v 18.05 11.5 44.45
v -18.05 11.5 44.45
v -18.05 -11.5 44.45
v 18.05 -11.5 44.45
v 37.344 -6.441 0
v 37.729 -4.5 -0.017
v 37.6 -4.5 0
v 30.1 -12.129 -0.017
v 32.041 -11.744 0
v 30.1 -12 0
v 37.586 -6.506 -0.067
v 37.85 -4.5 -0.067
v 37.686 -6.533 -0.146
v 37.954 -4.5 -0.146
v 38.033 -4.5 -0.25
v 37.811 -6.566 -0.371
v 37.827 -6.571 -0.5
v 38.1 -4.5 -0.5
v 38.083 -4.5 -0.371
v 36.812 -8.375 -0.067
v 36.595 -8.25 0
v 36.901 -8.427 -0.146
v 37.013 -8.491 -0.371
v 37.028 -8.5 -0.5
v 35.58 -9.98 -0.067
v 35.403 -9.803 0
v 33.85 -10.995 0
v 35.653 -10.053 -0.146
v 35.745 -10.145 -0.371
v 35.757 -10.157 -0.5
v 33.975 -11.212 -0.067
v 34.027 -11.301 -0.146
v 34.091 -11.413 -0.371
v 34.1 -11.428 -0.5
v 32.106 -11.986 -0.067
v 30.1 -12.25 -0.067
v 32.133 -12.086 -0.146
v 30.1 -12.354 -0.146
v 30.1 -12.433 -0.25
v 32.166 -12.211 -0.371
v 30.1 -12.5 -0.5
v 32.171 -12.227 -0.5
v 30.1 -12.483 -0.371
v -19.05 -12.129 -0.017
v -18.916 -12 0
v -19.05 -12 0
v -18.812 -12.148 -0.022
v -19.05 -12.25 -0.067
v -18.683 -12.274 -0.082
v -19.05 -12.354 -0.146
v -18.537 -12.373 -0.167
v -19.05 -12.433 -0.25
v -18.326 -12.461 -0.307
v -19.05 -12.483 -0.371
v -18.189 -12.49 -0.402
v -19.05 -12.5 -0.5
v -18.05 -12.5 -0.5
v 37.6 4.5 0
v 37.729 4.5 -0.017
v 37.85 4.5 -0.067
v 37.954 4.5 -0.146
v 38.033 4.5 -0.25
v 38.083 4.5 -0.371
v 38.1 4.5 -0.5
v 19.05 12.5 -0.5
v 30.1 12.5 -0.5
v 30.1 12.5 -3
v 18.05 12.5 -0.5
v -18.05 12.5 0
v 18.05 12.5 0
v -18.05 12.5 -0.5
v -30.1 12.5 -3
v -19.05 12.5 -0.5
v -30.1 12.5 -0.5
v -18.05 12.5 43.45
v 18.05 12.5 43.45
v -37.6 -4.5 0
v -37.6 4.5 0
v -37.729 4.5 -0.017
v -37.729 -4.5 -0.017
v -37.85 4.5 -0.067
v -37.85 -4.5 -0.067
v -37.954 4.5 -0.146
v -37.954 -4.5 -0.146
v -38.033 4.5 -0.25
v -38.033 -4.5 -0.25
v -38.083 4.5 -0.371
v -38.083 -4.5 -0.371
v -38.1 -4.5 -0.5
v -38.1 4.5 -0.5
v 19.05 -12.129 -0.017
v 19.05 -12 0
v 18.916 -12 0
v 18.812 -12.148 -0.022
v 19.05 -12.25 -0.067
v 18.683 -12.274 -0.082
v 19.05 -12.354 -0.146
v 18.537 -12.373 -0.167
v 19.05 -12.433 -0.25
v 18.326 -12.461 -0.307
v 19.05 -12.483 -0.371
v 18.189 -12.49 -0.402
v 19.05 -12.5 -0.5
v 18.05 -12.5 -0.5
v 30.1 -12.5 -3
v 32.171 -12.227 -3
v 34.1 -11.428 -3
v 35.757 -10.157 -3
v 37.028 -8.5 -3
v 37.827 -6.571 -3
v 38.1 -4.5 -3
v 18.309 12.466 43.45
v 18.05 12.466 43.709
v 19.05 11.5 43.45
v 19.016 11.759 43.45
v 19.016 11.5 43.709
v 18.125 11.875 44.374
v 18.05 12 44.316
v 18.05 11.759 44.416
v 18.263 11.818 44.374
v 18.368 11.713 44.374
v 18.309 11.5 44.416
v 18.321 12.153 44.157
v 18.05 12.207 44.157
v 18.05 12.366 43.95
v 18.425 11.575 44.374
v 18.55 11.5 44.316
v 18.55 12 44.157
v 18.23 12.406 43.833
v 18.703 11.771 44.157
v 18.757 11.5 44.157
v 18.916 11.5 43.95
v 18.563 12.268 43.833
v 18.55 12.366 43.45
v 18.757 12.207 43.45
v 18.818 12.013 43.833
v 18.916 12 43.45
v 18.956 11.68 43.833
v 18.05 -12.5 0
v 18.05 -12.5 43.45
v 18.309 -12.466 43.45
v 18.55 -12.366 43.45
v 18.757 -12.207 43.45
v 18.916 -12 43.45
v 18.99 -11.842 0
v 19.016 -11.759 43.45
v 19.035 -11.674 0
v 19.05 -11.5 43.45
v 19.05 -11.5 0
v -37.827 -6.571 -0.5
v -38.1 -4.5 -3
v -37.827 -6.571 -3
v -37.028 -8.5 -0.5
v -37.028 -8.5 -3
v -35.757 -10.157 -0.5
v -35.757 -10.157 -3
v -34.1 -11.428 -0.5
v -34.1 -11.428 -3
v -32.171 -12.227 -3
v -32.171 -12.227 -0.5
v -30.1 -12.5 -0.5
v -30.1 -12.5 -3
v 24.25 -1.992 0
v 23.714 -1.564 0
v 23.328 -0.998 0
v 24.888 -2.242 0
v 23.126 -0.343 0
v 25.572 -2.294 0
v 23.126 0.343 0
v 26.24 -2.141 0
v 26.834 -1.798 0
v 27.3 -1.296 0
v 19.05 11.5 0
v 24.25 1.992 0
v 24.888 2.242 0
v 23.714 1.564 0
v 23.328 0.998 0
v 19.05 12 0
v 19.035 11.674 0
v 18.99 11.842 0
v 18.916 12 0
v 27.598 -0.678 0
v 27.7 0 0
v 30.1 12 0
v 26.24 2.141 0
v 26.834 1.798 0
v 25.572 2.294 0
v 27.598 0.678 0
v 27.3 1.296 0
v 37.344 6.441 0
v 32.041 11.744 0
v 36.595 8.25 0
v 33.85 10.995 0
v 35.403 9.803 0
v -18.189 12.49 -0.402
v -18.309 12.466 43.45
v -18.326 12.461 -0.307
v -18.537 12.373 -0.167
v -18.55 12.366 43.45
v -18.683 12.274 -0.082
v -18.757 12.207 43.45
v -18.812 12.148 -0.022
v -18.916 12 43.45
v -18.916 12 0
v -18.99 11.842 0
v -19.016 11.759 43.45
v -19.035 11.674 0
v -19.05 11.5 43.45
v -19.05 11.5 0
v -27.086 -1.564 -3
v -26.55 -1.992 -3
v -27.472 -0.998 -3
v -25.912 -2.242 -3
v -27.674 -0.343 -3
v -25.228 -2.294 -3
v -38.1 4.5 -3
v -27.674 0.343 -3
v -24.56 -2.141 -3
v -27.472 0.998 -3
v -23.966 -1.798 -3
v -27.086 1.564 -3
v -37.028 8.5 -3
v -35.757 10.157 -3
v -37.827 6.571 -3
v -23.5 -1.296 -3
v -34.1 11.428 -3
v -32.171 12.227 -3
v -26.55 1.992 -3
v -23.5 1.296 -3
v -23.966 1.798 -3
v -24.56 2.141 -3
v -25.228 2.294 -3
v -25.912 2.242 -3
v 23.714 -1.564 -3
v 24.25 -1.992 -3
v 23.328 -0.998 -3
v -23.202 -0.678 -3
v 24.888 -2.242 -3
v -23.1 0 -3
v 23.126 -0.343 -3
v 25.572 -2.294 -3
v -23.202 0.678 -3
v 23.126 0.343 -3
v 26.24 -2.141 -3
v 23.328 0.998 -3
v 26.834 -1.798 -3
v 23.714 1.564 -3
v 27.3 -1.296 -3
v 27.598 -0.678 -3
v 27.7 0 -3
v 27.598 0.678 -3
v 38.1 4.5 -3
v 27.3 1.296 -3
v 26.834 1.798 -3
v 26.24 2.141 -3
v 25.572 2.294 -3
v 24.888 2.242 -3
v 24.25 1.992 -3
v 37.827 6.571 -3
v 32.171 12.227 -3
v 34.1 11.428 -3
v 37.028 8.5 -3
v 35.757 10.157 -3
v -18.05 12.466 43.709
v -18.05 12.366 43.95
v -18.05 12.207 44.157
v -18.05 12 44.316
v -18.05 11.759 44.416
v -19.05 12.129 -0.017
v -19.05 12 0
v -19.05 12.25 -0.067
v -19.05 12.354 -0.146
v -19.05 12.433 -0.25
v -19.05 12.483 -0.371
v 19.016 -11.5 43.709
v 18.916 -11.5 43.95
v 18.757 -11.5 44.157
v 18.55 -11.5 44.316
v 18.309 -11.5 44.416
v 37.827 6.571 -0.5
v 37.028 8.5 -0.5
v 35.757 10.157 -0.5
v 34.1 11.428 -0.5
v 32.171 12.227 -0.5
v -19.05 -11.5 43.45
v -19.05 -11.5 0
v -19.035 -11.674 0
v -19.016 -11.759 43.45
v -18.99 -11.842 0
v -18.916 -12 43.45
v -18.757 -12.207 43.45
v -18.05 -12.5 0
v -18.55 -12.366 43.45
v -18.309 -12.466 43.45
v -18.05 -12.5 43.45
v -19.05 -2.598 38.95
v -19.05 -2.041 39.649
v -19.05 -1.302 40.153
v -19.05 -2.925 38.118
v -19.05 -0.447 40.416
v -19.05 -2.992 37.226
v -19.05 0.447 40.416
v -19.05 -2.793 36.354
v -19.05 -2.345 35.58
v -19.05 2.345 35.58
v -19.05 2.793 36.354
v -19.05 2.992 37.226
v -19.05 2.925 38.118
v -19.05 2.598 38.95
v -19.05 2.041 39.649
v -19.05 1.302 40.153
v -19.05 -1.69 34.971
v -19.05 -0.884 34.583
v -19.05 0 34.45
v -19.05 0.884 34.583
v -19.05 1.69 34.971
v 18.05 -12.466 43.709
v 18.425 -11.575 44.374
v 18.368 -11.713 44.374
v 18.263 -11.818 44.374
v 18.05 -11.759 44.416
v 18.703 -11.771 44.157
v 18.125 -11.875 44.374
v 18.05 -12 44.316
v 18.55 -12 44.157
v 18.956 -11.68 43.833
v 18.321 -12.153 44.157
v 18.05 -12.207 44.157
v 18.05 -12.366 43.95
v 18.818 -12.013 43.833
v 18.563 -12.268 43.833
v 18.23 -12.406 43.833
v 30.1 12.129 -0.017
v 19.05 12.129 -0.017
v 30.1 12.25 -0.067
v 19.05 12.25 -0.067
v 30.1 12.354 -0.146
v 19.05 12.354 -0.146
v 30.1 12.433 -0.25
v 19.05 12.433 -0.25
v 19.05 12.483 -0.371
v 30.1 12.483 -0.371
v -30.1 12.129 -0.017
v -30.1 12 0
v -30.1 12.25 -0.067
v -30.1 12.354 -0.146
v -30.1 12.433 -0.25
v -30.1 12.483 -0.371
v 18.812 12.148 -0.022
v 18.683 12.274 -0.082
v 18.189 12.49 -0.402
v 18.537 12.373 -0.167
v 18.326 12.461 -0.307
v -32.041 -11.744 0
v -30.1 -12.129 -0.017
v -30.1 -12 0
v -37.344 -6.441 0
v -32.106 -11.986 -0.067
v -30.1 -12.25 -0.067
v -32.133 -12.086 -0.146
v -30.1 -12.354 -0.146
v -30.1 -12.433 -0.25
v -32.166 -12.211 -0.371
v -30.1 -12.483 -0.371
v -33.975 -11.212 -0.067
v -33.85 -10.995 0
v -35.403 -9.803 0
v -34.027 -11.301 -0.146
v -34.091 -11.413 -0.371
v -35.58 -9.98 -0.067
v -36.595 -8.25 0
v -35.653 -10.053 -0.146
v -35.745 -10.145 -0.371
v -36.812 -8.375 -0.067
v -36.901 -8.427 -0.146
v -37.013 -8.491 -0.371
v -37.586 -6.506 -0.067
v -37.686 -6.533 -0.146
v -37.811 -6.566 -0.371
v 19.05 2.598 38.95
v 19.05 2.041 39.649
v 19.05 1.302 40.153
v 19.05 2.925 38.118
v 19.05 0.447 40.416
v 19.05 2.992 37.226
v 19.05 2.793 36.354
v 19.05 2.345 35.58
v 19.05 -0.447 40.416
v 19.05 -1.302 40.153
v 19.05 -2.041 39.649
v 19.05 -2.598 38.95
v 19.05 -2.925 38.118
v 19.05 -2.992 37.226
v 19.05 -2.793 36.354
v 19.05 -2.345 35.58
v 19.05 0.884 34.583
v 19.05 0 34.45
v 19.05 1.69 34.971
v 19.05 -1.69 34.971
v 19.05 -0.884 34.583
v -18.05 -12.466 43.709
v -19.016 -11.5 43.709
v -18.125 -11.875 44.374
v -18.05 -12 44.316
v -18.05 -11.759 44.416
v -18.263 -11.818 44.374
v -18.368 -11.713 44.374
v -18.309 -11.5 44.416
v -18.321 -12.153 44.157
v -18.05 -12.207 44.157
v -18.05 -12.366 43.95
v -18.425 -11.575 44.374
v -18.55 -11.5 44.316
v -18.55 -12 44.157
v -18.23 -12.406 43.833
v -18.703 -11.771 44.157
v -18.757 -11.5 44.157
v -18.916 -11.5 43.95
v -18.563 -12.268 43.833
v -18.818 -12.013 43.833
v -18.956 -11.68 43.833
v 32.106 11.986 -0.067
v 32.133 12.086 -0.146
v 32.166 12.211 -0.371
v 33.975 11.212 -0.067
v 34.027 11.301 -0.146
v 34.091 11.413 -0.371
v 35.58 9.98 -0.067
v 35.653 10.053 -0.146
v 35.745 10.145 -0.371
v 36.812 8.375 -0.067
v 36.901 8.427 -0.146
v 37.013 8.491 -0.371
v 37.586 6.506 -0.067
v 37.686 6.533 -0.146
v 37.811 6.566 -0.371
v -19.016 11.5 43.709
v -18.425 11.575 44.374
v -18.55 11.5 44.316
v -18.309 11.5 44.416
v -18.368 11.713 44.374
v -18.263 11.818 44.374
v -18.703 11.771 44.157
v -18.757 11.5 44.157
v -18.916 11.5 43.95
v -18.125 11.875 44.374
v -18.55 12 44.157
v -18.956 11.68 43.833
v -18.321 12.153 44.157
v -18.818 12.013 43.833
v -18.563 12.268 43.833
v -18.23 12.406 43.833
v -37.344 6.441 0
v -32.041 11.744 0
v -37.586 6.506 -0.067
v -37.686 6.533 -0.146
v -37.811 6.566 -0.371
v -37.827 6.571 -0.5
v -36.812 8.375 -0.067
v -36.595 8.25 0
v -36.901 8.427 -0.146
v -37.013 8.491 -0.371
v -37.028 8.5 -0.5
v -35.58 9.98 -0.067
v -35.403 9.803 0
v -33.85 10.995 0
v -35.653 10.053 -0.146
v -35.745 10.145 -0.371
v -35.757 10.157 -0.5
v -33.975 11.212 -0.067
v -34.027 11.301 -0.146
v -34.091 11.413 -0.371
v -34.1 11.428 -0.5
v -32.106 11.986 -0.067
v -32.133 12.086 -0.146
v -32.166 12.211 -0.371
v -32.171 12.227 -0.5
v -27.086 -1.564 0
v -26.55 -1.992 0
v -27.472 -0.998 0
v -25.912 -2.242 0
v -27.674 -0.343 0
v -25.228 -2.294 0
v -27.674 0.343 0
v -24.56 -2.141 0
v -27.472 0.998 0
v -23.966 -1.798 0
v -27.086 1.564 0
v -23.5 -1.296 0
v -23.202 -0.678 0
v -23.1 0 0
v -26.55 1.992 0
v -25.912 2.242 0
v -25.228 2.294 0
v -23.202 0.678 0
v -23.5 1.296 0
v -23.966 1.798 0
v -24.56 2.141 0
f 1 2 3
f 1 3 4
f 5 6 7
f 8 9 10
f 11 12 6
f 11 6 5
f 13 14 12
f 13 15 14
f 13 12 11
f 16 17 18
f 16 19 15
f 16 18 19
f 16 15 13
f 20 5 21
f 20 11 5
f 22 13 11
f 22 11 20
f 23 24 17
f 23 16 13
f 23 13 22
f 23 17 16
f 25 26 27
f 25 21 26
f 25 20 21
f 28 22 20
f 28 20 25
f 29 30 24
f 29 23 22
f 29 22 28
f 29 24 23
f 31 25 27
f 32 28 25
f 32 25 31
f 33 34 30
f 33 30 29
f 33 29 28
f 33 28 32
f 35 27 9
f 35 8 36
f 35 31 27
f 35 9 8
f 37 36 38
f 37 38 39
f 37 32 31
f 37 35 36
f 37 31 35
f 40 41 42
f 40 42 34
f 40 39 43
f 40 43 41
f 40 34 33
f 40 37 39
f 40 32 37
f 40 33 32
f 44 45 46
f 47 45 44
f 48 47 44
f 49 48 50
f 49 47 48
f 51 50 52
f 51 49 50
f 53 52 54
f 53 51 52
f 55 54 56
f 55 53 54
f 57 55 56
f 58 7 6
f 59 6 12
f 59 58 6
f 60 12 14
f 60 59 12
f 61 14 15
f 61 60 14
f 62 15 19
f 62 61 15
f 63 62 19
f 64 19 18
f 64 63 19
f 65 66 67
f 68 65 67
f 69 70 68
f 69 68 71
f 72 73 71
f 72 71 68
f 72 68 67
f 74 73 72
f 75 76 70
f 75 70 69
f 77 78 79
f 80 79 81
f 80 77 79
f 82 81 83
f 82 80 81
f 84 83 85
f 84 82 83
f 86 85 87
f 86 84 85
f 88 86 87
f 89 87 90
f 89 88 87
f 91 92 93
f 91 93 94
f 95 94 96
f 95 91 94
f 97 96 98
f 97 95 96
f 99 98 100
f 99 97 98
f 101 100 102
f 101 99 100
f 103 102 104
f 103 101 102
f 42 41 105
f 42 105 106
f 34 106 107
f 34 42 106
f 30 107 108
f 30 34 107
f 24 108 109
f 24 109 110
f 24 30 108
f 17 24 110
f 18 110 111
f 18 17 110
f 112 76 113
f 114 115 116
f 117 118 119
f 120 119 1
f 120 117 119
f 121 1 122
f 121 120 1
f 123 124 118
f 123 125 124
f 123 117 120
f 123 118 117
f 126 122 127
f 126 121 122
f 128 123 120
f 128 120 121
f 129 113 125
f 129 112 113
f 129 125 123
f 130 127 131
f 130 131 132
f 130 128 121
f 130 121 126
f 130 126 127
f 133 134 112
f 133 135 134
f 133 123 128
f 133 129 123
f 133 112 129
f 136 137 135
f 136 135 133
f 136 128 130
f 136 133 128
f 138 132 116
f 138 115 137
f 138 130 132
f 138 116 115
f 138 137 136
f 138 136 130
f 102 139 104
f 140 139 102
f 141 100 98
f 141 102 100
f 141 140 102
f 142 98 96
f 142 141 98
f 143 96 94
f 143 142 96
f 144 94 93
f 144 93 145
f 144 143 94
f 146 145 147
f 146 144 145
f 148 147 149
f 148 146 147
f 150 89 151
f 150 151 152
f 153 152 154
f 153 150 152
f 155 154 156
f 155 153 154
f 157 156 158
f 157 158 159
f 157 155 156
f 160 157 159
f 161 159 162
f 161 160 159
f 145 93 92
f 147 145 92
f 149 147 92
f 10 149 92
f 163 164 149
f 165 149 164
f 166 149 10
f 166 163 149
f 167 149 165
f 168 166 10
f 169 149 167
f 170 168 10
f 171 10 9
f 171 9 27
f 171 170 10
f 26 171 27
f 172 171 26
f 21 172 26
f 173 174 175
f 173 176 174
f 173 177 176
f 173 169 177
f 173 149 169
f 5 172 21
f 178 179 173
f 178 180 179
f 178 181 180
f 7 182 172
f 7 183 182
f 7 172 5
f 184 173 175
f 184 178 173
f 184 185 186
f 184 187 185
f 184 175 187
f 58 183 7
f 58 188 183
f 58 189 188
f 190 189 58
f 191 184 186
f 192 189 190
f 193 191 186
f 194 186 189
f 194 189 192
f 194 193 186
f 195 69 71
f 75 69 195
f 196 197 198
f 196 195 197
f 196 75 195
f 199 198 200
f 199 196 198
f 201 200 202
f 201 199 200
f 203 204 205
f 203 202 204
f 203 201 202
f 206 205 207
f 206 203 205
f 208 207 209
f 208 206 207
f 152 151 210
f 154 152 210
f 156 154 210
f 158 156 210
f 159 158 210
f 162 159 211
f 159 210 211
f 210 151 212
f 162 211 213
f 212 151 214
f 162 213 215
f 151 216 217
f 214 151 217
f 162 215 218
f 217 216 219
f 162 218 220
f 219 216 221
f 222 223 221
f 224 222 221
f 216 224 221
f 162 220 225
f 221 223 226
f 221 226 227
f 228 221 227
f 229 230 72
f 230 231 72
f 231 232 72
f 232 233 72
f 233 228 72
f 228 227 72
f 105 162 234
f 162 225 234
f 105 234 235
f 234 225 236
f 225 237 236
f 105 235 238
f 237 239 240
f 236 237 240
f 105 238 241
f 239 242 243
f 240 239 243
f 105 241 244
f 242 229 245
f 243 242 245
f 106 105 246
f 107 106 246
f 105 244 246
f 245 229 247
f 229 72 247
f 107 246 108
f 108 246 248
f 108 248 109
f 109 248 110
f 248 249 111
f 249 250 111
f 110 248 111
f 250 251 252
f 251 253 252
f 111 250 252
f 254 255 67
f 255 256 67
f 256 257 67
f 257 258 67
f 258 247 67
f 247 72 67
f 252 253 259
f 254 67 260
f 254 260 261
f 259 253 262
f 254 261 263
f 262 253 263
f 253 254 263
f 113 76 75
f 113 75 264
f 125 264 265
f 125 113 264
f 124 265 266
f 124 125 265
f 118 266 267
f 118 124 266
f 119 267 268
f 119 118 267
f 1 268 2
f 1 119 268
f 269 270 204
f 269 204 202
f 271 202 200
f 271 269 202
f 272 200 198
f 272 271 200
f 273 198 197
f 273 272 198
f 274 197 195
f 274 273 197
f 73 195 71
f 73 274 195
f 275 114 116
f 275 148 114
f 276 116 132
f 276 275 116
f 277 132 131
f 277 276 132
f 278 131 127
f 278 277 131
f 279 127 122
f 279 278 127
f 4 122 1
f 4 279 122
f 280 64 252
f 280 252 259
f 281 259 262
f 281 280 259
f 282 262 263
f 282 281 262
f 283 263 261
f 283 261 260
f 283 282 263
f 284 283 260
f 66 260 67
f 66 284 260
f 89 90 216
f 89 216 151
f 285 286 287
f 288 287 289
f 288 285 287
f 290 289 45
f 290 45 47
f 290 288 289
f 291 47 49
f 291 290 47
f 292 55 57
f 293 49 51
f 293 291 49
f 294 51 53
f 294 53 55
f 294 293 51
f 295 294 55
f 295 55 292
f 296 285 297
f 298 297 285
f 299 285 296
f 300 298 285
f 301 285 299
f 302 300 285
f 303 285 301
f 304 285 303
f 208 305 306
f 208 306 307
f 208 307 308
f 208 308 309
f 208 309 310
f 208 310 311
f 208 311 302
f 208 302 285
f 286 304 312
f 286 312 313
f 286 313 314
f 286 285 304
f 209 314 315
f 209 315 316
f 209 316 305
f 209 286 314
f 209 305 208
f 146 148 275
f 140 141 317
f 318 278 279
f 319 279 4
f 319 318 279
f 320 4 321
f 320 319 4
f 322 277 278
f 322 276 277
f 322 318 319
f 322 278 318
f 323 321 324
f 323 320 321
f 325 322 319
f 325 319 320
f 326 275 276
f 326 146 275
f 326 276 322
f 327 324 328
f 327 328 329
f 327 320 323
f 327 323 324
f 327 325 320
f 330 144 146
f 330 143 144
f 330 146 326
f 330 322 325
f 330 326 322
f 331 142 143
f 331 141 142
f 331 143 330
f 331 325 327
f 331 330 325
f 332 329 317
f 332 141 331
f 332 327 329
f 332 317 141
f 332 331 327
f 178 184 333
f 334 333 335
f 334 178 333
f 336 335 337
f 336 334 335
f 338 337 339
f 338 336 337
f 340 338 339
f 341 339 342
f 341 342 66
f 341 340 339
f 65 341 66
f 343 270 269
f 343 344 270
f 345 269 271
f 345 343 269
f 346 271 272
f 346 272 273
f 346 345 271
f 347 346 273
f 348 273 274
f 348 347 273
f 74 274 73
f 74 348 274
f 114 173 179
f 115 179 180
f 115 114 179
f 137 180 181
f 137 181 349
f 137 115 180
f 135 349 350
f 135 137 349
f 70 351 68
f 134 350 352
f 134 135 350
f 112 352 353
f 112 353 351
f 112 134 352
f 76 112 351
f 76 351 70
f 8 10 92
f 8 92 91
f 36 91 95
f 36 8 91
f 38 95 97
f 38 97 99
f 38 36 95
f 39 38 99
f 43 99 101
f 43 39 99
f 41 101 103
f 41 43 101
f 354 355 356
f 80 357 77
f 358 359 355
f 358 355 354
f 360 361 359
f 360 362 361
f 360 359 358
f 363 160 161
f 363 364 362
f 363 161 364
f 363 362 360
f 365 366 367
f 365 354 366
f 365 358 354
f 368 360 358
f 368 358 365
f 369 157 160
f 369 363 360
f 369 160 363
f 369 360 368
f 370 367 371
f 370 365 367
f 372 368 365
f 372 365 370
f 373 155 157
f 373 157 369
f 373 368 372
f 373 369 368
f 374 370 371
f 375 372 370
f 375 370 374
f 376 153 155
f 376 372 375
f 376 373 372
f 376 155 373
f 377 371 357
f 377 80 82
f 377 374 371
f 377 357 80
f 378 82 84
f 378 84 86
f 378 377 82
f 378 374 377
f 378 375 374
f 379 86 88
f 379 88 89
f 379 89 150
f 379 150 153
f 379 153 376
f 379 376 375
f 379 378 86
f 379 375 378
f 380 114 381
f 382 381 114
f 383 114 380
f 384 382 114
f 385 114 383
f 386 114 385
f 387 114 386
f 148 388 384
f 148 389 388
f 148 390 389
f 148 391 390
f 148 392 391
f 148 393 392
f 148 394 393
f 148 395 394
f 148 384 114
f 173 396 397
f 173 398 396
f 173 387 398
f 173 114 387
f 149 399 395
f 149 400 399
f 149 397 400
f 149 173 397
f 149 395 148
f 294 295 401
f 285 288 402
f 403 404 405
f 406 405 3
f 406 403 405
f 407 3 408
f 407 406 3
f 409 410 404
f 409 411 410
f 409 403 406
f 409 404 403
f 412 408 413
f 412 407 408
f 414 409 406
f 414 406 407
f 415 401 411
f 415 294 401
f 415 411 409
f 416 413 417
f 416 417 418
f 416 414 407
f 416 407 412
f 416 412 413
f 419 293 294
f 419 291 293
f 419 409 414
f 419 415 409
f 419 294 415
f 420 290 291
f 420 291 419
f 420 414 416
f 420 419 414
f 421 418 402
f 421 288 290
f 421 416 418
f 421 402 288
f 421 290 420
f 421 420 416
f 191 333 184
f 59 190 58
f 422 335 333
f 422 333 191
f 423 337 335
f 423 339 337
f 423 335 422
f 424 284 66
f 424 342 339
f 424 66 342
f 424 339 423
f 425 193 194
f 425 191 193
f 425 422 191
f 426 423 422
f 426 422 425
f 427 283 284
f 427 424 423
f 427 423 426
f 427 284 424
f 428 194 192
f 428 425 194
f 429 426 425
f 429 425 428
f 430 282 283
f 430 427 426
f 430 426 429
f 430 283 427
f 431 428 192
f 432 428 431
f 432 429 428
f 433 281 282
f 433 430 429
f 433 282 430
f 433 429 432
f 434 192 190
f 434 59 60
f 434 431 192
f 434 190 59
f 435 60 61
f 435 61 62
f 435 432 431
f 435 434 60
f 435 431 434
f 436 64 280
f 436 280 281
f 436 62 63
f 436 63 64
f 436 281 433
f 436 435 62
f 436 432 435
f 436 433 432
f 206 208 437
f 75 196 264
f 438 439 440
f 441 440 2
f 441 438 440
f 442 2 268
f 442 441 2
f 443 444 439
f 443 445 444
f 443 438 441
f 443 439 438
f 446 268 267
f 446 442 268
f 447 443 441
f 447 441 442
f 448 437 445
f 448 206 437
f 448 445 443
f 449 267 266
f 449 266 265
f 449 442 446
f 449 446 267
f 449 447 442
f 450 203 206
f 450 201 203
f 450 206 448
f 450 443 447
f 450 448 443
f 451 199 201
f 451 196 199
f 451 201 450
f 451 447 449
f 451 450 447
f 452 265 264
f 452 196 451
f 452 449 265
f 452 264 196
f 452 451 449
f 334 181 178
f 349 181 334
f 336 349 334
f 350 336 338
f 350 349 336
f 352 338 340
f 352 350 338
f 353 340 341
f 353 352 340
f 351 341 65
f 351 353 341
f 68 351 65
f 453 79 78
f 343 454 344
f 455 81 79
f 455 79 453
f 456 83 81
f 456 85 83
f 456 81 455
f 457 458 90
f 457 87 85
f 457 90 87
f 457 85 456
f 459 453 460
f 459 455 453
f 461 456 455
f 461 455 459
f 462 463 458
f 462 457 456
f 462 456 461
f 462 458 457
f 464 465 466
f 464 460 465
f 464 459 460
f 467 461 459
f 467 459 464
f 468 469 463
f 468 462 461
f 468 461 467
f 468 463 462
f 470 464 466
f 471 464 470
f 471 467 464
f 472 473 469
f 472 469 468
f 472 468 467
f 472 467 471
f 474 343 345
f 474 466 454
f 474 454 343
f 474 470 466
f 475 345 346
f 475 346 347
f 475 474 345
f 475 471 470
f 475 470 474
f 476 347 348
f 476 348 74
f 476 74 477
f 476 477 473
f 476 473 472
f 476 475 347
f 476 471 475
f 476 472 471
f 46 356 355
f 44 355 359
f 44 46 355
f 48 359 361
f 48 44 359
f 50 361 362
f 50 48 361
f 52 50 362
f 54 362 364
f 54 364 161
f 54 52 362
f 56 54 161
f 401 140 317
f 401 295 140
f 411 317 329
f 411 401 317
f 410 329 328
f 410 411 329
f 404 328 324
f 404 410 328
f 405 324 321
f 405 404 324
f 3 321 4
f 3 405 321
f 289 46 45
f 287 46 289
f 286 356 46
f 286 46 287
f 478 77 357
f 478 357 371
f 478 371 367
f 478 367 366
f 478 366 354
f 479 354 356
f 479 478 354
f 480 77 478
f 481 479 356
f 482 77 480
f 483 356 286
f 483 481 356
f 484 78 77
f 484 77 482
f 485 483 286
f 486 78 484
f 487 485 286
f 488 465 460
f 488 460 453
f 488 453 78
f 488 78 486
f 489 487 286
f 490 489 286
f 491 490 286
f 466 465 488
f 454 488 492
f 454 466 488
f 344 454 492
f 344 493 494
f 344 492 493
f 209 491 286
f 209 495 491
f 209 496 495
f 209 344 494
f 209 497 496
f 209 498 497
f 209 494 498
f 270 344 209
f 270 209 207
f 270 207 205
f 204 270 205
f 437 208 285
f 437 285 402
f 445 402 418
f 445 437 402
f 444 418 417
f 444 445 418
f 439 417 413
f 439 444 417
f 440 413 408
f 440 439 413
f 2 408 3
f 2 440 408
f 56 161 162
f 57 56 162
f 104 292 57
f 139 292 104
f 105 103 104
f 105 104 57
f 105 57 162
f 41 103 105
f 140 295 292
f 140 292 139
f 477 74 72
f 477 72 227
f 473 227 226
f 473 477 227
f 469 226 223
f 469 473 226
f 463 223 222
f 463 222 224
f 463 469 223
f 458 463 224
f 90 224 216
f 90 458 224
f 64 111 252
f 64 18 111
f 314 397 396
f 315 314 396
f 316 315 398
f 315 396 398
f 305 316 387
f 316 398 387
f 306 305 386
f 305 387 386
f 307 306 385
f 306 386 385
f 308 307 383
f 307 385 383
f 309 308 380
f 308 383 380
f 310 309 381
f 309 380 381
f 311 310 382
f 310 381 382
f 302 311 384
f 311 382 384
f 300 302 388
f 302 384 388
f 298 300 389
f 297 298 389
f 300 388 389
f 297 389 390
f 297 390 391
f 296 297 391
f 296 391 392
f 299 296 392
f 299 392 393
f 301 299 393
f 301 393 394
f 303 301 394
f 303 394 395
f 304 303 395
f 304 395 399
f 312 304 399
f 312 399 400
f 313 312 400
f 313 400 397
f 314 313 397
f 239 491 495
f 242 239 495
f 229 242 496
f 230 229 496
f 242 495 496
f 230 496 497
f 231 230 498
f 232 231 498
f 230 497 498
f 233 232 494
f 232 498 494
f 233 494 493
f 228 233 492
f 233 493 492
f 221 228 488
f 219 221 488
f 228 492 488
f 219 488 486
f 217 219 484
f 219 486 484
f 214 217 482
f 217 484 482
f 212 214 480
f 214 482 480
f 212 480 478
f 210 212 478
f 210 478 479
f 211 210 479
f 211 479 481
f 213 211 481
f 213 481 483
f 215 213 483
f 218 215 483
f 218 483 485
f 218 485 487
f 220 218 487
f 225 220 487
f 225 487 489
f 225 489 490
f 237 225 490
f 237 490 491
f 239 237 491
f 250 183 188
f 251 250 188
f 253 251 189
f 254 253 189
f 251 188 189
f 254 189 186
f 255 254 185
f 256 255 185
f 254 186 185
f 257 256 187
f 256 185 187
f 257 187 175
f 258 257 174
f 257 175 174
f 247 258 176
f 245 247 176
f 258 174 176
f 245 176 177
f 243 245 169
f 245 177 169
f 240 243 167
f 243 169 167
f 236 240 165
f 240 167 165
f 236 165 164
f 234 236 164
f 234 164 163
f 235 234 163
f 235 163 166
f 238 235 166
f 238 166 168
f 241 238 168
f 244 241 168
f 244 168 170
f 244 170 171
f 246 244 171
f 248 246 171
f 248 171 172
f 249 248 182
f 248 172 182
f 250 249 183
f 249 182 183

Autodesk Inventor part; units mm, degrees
ref_plane "YZ Plane" through (0, 0, 0) normal (1, 0, 0) x (0, 1, 0)
ref_plane "XZ Plane" through (0, 0, 0) normal (0, 1, 0) x (-1, 0, 0)
ref_plane "XY Plane" through (0, 0, 0) normal (0, 0, 1) x (1, 0, 0)
sketch "Sketch1" plane through (0, 0, 0) normal (0, 0, 1) x (1, 0, 0)
  line L0 (-30.1, -12.5) -> (30.1, -12.5)
  line L1 (38.1, -4.5) -> (38.1, 4.5)
  line L2 (30.1, 12.5) -> (-30.1, 12.5)
  line L3 (-38.1, 4.5) -> (-38.1, -4.5)
  line L4 (-38.1, -12.5) -> (38.1, 12.5) construction
  line L5 (38.1, -12.5) -> (-38.1, 12.5) construction
  line L6 (-38.1, 0) -> (38.1, 0) construction
  line L7 (0, 12.5) -> (0, -12.5) construction
  circle A0 centre (0, 0) radius 25.4 construction
  line L8 (-19.05, 12.5) -> (19.05, 12.5) construction
  line L9 (19.05, 12.5) -> (19.05, -12.5)
  line L10 (19.05, -12.5) -> (-19.05, -12.5) construction
  line L11 (-19.05, -12.5) -> (-19.05, 12.5)
  line L12 (-19.05, 12.5) -> (19.05, -12.5) construction
  line L13 (19.05, 12.5) -> (-19.05, -12.5) construction
  circle A1 centre (-25.4, 0) radius 2.3
  circle A2 centre (25.4, 0) radius 2.3
  arc A3 (-30.1, 12.5) -> (-38.1, 4.5) centre (-30.1, 4.5) ccw
  arc A4 (-38.1, -4.5) -> (-30.1, -12.5) centre (-30.1, -4.5) ccw
  arc A5 (30.1, -12.5) -> (38.1, -4.5) centre (30.1, -4.5) ccw
  arc A6 (38.1, 4.5) -> (30.1, 12.5) centre (30.1, 4.5) ccw
  dimension "d2" = 50.8
  dimension "d0" = 76.2
  dimension "d1" = 25
  dimension "d3" = 38.1
  dimension "d4" = 25
  dimension "d5" = 4.6
  dimension "d6" = 8
extrude "Extrusion1" add sketch "Sketch1" against normal blind 3
extrude "Extrusion2" add sketch "Sketch1" along normal blind 44.45 contours L11 L2 L9 L0
sketch "Sketch2" plane through (19.05, -12.5, 0) normal (1, 0, 0) x (0, 0, -1)
  line L0 (-44.45, 0) -> (-44.45, 25) construction
  line L1 (-44.45, 12.5) -> (3, 12.5) construction
  line L2 (3, 8) -> (3, 17) construction
  circle A0 centre (-37.45, 12.5) radius 3
  point P0 (0, 12.5)
  dimension "d11" = 6
  dimension "d12" = 7
extrude "Extrusion3" cut sketch "Sketch2" against normal blind 44.45
fillet "Fillet1" radius 1 4 edges at (19.05, -12.5, 22.225) (19.05, 12.5, 22.225) (-19.05, 12.5, 22.225) (-19.05, -12.5, 22.225)
fillet "Fillet2" radius 1 8 edges at (-18.7571, -12.2071, 44.45) (0, -12.5, 44.45) (18.7571, -12.2071, 44.45) (19.05, 0, 44.45) (18.7571, 12.2071, 44.45) (0, 12.5, 44.45) (-18.7571, 12.2071, 44.45) (-19.05, 0, 44.45)
fillet "Fillet3" radius 0.5 14 edges at (-35.7569, -10.1569, 0) (-18.55, -12.5, 0) (-24.575, -12.5, 0) (-35.7569, 10.1569, 0) (-18.55, 12.5, 0) (-24.575, 12.5, 0) (-38.1, 0, 0) (38.1, 0, 0) (35.7569, 10.1569, 0) (18.55, 12.5, 0) (24.575, 12.5, 0) (18.55, -12.5, 0) (24.575, -12.5, 0) (35.7569, -10.1569, 0)
properties part number "camstand1.75inch tall"
